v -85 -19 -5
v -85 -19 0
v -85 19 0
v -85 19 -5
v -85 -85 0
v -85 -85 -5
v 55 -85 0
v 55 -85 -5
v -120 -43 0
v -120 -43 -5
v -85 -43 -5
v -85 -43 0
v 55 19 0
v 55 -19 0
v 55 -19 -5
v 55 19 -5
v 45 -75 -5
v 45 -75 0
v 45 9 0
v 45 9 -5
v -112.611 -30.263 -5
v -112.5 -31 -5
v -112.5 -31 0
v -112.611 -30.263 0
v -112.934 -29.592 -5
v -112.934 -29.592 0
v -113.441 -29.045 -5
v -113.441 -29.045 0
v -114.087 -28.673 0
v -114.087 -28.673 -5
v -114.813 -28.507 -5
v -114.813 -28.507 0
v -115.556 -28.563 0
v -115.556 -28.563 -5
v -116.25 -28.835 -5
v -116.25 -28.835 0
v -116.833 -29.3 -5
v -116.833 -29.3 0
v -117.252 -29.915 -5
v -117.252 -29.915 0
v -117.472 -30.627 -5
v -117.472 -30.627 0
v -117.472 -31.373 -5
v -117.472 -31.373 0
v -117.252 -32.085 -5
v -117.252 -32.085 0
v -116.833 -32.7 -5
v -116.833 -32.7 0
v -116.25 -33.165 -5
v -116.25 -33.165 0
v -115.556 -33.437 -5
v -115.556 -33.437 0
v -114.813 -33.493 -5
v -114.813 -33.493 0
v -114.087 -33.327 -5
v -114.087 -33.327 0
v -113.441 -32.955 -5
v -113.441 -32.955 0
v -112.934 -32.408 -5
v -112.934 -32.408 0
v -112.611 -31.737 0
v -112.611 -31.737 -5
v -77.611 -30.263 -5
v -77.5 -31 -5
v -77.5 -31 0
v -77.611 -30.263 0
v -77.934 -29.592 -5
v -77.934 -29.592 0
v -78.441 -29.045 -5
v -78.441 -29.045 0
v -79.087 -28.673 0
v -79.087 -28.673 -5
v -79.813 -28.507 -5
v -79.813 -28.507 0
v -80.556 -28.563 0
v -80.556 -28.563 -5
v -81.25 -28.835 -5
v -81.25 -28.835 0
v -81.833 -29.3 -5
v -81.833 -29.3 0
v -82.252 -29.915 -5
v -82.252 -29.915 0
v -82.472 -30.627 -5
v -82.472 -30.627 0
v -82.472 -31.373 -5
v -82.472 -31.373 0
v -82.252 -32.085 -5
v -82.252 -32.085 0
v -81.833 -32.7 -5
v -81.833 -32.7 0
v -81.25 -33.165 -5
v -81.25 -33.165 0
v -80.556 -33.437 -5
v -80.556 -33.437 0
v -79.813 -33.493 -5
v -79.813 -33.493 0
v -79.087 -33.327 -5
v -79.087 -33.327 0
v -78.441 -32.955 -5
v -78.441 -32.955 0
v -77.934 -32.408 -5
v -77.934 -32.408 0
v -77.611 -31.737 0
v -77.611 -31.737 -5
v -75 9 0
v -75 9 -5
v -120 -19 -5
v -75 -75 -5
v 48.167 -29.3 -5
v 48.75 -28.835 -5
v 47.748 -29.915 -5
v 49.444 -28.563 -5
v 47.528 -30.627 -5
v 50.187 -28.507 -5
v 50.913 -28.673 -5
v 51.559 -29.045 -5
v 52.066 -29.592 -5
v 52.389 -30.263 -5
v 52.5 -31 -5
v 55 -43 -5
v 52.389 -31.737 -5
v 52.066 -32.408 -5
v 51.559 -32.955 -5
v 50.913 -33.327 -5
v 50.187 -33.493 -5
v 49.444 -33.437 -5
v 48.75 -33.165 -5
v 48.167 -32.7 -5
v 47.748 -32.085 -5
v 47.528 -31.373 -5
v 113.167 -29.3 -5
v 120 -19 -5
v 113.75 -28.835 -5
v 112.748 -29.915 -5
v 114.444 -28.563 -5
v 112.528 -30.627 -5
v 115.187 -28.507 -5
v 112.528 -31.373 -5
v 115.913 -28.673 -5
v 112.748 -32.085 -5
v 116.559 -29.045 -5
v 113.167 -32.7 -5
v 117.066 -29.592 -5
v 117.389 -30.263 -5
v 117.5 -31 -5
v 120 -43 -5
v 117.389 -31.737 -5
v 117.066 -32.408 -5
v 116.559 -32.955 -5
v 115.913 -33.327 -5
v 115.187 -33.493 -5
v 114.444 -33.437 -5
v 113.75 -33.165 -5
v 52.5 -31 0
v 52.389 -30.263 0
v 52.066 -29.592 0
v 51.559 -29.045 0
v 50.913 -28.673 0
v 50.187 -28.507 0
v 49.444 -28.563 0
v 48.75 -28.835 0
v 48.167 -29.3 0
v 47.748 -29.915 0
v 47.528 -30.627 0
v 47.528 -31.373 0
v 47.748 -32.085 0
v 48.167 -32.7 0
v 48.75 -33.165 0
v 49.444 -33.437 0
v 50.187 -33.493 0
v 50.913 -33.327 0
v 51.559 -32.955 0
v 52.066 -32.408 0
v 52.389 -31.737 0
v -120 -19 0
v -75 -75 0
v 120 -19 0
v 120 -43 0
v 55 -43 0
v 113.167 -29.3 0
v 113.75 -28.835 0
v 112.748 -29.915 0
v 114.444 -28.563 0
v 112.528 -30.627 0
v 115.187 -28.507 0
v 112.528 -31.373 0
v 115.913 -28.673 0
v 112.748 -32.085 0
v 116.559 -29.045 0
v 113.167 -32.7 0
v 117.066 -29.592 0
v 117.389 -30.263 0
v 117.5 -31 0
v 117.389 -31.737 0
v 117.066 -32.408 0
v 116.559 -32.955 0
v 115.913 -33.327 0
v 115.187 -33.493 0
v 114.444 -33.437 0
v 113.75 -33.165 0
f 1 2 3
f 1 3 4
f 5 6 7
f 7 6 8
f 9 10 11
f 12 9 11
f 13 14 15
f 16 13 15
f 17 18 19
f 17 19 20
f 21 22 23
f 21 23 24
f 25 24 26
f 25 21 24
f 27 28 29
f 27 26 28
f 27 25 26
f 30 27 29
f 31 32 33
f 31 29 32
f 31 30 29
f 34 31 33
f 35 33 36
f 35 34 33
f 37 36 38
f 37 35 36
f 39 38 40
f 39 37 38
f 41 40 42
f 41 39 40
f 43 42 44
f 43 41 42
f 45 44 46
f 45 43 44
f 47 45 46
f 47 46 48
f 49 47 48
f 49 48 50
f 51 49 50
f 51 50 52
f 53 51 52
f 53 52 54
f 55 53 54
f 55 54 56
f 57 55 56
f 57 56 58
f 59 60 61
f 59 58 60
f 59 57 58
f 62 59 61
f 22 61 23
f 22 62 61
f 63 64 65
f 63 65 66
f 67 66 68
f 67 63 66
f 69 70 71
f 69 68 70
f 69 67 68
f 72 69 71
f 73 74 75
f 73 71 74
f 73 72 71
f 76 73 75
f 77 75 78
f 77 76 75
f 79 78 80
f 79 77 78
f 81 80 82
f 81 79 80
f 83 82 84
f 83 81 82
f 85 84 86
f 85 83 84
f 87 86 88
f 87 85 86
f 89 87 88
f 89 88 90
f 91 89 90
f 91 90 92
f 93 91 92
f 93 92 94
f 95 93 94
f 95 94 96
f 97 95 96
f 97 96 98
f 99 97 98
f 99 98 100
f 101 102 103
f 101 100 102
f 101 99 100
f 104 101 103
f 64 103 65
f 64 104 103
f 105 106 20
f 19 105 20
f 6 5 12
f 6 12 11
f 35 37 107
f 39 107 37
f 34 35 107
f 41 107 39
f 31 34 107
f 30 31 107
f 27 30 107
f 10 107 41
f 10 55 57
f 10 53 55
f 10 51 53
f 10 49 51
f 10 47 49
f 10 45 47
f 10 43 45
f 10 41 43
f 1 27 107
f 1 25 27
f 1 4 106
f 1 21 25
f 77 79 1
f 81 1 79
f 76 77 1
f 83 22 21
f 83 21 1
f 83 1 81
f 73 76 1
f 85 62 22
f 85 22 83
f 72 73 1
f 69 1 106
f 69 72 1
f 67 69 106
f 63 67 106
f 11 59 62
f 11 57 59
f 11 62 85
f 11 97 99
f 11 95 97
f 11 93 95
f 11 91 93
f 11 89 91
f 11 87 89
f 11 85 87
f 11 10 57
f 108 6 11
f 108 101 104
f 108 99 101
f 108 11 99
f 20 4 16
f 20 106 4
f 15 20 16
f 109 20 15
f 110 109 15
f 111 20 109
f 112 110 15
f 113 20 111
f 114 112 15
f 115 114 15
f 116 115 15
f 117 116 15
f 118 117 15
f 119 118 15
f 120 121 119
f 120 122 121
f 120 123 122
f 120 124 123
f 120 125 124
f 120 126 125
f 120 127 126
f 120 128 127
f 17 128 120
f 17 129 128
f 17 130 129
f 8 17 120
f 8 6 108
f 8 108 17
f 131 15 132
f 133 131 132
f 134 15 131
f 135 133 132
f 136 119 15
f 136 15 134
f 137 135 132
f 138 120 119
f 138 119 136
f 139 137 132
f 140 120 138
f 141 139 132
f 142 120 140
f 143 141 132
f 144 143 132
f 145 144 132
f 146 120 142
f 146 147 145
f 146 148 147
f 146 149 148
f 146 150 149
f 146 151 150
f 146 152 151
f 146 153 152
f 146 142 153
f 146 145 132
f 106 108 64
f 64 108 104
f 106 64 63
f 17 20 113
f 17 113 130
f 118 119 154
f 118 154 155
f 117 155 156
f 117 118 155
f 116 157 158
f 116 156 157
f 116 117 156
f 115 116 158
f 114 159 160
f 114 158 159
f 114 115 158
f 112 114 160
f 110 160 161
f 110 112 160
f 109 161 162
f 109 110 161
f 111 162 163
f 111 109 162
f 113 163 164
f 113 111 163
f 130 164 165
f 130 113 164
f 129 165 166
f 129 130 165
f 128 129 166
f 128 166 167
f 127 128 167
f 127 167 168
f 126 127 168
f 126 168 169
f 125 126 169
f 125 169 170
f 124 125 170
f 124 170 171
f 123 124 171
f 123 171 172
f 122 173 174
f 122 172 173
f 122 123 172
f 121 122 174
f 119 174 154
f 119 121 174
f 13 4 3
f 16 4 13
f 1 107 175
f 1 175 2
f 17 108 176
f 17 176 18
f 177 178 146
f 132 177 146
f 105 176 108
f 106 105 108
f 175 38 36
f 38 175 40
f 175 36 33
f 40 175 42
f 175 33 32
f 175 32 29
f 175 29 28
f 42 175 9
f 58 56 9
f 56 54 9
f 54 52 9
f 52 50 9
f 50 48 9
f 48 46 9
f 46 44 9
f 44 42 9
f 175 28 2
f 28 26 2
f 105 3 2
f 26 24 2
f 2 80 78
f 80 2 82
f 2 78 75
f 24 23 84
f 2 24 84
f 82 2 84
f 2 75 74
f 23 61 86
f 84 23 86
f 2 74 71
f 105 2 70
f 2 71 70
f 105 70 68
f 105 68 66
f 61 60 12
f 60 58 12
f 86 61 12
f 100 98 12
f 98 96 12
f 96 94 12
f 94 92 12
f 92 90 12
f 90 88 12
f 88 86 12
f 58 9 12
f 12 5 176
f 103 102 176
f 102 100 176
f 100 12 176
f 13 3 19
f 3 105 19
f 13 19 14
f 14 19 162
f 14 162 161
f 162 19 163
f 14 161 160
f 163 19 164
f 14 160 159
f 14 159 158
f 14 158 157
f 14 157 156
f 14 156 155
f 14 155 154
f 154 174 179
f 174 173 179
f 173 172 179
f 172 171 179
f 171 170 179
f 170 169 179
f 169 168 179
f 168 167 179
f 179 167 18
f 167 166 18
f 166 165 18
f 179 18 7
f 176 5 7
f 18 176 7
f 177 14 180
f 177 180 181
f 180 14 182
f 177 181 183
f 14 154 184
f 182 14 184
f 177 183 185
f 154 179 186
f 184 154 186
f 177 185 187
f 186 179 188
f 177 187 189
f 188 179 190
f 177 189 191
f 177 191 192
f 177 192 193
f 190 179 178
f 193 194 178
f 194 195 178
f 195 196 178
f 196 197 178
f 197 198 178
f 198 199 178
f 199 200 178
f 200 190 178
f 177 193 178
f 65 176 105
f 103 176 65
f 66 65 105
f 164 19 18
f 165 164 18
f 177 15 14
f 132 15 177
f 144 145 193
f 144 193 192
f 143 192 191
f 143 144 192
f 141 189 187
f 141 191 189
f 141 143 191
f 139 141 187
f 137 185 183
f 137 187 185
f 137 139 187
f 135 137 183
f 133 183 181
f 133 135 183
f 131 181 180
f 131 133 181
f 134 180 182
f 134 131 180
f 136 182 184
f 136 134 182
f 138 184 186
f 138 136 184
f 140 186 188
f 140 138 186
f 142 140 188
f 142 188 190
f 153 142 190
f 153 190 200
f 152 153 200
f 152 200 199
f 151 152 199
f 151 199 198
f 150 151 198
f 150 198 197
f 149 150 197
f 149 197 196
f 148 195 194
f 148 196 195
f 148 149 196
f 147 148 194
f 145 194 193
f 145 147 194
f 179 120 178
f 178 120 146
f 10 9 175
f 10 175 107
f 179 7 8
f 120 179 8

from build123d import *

# Parameters (mm, degrees)
BOX015_W               = 120
BOX015_H               = 30
BOX015_DEPTH           = 84
CYLINDER069_R          = 2.5
CYLINDER069_DEPTH      = 10
CYLINDER070_R          = 2.5
CYLINDER070_DEPTH      = 10
CYLINDER071_R          = 2.5
CYLINDER071_DEPTH      = 10
CYLINDER072_R          = 2.5
CYLINDER072_DEPTH      = 10
CYLINDER068_R          = 2.5
CYLINDER068_DEPTH      = 10
CYLINDER073_R          = 2.5
CYLINDER073_DEPTH      = 10
BOX009_W               = 240
BOX009_H               = 5
BOX009_DEPTH           = 24
BOX010_W               = 140
BOX010_H               = 5
BOX010_DEPTH           = 38
BOX011_W               = 140
BOX011_H               = 5
BOX011_DEPTH           = 42
CUT008_PLACEMENT_ANGLE = 270


with BuildPart() as gatewaycut001:
    # Box015 → Box015 (new body)
    with BuildSketch(Plane(origin=(-75, -3.2, -75), x_dir=(1, 0, 0), z_dir=(0, 0, 1))):
        with Locations((60, 15)):
            Rectangle(BOX015_W, BOX015_H)
    extrude(amount=BOX015_DEPTH)


with BuildPart() as cylinder069:
    # Cylinder069 → Cylinder069 (new body)
    with BuildSketch(Plane(origin=(115, 0, -31), x_dir=(1, 0, 0), z_dir=(0, -1, 0))):
        Circle(CYLINDER069_R)
    extrude(amount=CYLINDER069_DEPTH)


with BuildPart() as cylinder070:
    # Cylinder070 → Cylinder070 (new body)
    with BuildSketch(Plane(origin=(-80, 0, -31), x_dir=(1, 0, 0), z_dir=(0, -1, 0))):
        Circle(CYLINDER070_R)
    extrude(amount=CYLINDER070_DEPTH)


with BuildPart() as cylinder071:
    # Cylinder071 → Cylinder071 (new body)
    with BuildSketch(Plane(origin=(50, 0, -31), x_dir=(1, 0, 0), z_dir=(0, -1, 0))):
        Circle(CYLINDER071_R)
    extrude(amount=CYLINDER071_DEPTH)


with BuildPart() as cylinder072:
    # Cylinder072 → Cylinder072 (new body)
    with BuildSketch(Plane(origin=(-45.75, 0, -56.3), x_dir=(1, 0, 0), z_dir=(0, -1, 0))):
        Circle(CYLINDER072_R)
    extrude(amount=CYLINDER072_DEPTH)


with BuildPart() as cylinder068:
    # Cylinder068 → Cylinder068 (new body)
    with BuildSketch(Plane(origin=(-115, 0, -31), x_dir=(1, 0, 0), z_dir=(0, -1, 0))):
        Circle(CYLINDER068_R)
    extrude(amount=CYLINDER068_DEPTH)


with BuildPart() as m3heatsetinserts003:
    # Cylinder073 → Cylinder073 (new body)
    with BuildSketch(Plane(origin=(-45.75, 0, -1.3), x_dir=(1, 0, 0), z_dir=(0, -1, 0))):
        Circle(CYLINDER073_R)
    extrude(amount=CYLINDER073_DEPTH)

    # Fusion025: union Cylinder069, Cylinder070, Cylinder071, Cylinder072, Cylinder068
    add(cylinder069.part)
    add(cylinder070.part)
    add(cylinder071.part)
    add(cylinder072.part)
    add(cylinder068.part)


with BuildPart() as m3heatsetinserts003_1:
    # Fusion025 placement: moved
    add(m3heatsetinserts003.part.moved(Location((0, 5.1, 0))))


with BuildPart() as cube007:
    # Box009 → Box009 (new body)
    with BuildSketch(Plane(origin=(-120, 0, -43), x_dir=(1, 0, 0), z_dir=(0, 0, 1))):
        with Locations((120, 2.5)):
            Rectangle(BOX009_W, BOX009_H)
    extrude(amount=BOX009_DEPTH)


with BuildPart() as cube008:
    # Box010 → Box010 (new body)
    with BuildSketch(Plane(origin=(-85, 0, -19), x_dir=(1, 0, 0), z_dir=(0, 0, 1))):
        with Locations((70, 2.5)):
            Rectangle(BOX010_W, BOX010_H)
    extrude(amount=BOX010_DEPTH)


with BuildPart() as mainbase001:
    # Box011 → Box011 (new body)
    with BuildSketch(Plane(origin=(-85, 0, -85), x_dir=(1, 0, 0), z_dir=(0, 0, 1))):
        with Locations((70, 2.5)):
            Rectangle(BOX011_W, BOX011_H)
    extrude(amount=BOX011_DEPTH)

    # Fusion020: union Cube007, Cube008
    add(cube007.part)
    add(cube008.part)

    # Cut007: cut M3HeatSetInserts003
    add(m3heatsetinserts003_1.part, mode=Mode.SUBTRACT)

    # Cut008: cut GatewayCut001
    add(gatewaycut001.part, mode=Mode.SUBTRACT)


with BuildPart() as mainbase001_1:
    # Cut008 placement: moved
    add(mainbase001.part.rotate(Axis((0, 0, 0), (1, 0, 0)), CUT008_PLACEMENT_ANGLE))


solid = mainbase001_1.part
